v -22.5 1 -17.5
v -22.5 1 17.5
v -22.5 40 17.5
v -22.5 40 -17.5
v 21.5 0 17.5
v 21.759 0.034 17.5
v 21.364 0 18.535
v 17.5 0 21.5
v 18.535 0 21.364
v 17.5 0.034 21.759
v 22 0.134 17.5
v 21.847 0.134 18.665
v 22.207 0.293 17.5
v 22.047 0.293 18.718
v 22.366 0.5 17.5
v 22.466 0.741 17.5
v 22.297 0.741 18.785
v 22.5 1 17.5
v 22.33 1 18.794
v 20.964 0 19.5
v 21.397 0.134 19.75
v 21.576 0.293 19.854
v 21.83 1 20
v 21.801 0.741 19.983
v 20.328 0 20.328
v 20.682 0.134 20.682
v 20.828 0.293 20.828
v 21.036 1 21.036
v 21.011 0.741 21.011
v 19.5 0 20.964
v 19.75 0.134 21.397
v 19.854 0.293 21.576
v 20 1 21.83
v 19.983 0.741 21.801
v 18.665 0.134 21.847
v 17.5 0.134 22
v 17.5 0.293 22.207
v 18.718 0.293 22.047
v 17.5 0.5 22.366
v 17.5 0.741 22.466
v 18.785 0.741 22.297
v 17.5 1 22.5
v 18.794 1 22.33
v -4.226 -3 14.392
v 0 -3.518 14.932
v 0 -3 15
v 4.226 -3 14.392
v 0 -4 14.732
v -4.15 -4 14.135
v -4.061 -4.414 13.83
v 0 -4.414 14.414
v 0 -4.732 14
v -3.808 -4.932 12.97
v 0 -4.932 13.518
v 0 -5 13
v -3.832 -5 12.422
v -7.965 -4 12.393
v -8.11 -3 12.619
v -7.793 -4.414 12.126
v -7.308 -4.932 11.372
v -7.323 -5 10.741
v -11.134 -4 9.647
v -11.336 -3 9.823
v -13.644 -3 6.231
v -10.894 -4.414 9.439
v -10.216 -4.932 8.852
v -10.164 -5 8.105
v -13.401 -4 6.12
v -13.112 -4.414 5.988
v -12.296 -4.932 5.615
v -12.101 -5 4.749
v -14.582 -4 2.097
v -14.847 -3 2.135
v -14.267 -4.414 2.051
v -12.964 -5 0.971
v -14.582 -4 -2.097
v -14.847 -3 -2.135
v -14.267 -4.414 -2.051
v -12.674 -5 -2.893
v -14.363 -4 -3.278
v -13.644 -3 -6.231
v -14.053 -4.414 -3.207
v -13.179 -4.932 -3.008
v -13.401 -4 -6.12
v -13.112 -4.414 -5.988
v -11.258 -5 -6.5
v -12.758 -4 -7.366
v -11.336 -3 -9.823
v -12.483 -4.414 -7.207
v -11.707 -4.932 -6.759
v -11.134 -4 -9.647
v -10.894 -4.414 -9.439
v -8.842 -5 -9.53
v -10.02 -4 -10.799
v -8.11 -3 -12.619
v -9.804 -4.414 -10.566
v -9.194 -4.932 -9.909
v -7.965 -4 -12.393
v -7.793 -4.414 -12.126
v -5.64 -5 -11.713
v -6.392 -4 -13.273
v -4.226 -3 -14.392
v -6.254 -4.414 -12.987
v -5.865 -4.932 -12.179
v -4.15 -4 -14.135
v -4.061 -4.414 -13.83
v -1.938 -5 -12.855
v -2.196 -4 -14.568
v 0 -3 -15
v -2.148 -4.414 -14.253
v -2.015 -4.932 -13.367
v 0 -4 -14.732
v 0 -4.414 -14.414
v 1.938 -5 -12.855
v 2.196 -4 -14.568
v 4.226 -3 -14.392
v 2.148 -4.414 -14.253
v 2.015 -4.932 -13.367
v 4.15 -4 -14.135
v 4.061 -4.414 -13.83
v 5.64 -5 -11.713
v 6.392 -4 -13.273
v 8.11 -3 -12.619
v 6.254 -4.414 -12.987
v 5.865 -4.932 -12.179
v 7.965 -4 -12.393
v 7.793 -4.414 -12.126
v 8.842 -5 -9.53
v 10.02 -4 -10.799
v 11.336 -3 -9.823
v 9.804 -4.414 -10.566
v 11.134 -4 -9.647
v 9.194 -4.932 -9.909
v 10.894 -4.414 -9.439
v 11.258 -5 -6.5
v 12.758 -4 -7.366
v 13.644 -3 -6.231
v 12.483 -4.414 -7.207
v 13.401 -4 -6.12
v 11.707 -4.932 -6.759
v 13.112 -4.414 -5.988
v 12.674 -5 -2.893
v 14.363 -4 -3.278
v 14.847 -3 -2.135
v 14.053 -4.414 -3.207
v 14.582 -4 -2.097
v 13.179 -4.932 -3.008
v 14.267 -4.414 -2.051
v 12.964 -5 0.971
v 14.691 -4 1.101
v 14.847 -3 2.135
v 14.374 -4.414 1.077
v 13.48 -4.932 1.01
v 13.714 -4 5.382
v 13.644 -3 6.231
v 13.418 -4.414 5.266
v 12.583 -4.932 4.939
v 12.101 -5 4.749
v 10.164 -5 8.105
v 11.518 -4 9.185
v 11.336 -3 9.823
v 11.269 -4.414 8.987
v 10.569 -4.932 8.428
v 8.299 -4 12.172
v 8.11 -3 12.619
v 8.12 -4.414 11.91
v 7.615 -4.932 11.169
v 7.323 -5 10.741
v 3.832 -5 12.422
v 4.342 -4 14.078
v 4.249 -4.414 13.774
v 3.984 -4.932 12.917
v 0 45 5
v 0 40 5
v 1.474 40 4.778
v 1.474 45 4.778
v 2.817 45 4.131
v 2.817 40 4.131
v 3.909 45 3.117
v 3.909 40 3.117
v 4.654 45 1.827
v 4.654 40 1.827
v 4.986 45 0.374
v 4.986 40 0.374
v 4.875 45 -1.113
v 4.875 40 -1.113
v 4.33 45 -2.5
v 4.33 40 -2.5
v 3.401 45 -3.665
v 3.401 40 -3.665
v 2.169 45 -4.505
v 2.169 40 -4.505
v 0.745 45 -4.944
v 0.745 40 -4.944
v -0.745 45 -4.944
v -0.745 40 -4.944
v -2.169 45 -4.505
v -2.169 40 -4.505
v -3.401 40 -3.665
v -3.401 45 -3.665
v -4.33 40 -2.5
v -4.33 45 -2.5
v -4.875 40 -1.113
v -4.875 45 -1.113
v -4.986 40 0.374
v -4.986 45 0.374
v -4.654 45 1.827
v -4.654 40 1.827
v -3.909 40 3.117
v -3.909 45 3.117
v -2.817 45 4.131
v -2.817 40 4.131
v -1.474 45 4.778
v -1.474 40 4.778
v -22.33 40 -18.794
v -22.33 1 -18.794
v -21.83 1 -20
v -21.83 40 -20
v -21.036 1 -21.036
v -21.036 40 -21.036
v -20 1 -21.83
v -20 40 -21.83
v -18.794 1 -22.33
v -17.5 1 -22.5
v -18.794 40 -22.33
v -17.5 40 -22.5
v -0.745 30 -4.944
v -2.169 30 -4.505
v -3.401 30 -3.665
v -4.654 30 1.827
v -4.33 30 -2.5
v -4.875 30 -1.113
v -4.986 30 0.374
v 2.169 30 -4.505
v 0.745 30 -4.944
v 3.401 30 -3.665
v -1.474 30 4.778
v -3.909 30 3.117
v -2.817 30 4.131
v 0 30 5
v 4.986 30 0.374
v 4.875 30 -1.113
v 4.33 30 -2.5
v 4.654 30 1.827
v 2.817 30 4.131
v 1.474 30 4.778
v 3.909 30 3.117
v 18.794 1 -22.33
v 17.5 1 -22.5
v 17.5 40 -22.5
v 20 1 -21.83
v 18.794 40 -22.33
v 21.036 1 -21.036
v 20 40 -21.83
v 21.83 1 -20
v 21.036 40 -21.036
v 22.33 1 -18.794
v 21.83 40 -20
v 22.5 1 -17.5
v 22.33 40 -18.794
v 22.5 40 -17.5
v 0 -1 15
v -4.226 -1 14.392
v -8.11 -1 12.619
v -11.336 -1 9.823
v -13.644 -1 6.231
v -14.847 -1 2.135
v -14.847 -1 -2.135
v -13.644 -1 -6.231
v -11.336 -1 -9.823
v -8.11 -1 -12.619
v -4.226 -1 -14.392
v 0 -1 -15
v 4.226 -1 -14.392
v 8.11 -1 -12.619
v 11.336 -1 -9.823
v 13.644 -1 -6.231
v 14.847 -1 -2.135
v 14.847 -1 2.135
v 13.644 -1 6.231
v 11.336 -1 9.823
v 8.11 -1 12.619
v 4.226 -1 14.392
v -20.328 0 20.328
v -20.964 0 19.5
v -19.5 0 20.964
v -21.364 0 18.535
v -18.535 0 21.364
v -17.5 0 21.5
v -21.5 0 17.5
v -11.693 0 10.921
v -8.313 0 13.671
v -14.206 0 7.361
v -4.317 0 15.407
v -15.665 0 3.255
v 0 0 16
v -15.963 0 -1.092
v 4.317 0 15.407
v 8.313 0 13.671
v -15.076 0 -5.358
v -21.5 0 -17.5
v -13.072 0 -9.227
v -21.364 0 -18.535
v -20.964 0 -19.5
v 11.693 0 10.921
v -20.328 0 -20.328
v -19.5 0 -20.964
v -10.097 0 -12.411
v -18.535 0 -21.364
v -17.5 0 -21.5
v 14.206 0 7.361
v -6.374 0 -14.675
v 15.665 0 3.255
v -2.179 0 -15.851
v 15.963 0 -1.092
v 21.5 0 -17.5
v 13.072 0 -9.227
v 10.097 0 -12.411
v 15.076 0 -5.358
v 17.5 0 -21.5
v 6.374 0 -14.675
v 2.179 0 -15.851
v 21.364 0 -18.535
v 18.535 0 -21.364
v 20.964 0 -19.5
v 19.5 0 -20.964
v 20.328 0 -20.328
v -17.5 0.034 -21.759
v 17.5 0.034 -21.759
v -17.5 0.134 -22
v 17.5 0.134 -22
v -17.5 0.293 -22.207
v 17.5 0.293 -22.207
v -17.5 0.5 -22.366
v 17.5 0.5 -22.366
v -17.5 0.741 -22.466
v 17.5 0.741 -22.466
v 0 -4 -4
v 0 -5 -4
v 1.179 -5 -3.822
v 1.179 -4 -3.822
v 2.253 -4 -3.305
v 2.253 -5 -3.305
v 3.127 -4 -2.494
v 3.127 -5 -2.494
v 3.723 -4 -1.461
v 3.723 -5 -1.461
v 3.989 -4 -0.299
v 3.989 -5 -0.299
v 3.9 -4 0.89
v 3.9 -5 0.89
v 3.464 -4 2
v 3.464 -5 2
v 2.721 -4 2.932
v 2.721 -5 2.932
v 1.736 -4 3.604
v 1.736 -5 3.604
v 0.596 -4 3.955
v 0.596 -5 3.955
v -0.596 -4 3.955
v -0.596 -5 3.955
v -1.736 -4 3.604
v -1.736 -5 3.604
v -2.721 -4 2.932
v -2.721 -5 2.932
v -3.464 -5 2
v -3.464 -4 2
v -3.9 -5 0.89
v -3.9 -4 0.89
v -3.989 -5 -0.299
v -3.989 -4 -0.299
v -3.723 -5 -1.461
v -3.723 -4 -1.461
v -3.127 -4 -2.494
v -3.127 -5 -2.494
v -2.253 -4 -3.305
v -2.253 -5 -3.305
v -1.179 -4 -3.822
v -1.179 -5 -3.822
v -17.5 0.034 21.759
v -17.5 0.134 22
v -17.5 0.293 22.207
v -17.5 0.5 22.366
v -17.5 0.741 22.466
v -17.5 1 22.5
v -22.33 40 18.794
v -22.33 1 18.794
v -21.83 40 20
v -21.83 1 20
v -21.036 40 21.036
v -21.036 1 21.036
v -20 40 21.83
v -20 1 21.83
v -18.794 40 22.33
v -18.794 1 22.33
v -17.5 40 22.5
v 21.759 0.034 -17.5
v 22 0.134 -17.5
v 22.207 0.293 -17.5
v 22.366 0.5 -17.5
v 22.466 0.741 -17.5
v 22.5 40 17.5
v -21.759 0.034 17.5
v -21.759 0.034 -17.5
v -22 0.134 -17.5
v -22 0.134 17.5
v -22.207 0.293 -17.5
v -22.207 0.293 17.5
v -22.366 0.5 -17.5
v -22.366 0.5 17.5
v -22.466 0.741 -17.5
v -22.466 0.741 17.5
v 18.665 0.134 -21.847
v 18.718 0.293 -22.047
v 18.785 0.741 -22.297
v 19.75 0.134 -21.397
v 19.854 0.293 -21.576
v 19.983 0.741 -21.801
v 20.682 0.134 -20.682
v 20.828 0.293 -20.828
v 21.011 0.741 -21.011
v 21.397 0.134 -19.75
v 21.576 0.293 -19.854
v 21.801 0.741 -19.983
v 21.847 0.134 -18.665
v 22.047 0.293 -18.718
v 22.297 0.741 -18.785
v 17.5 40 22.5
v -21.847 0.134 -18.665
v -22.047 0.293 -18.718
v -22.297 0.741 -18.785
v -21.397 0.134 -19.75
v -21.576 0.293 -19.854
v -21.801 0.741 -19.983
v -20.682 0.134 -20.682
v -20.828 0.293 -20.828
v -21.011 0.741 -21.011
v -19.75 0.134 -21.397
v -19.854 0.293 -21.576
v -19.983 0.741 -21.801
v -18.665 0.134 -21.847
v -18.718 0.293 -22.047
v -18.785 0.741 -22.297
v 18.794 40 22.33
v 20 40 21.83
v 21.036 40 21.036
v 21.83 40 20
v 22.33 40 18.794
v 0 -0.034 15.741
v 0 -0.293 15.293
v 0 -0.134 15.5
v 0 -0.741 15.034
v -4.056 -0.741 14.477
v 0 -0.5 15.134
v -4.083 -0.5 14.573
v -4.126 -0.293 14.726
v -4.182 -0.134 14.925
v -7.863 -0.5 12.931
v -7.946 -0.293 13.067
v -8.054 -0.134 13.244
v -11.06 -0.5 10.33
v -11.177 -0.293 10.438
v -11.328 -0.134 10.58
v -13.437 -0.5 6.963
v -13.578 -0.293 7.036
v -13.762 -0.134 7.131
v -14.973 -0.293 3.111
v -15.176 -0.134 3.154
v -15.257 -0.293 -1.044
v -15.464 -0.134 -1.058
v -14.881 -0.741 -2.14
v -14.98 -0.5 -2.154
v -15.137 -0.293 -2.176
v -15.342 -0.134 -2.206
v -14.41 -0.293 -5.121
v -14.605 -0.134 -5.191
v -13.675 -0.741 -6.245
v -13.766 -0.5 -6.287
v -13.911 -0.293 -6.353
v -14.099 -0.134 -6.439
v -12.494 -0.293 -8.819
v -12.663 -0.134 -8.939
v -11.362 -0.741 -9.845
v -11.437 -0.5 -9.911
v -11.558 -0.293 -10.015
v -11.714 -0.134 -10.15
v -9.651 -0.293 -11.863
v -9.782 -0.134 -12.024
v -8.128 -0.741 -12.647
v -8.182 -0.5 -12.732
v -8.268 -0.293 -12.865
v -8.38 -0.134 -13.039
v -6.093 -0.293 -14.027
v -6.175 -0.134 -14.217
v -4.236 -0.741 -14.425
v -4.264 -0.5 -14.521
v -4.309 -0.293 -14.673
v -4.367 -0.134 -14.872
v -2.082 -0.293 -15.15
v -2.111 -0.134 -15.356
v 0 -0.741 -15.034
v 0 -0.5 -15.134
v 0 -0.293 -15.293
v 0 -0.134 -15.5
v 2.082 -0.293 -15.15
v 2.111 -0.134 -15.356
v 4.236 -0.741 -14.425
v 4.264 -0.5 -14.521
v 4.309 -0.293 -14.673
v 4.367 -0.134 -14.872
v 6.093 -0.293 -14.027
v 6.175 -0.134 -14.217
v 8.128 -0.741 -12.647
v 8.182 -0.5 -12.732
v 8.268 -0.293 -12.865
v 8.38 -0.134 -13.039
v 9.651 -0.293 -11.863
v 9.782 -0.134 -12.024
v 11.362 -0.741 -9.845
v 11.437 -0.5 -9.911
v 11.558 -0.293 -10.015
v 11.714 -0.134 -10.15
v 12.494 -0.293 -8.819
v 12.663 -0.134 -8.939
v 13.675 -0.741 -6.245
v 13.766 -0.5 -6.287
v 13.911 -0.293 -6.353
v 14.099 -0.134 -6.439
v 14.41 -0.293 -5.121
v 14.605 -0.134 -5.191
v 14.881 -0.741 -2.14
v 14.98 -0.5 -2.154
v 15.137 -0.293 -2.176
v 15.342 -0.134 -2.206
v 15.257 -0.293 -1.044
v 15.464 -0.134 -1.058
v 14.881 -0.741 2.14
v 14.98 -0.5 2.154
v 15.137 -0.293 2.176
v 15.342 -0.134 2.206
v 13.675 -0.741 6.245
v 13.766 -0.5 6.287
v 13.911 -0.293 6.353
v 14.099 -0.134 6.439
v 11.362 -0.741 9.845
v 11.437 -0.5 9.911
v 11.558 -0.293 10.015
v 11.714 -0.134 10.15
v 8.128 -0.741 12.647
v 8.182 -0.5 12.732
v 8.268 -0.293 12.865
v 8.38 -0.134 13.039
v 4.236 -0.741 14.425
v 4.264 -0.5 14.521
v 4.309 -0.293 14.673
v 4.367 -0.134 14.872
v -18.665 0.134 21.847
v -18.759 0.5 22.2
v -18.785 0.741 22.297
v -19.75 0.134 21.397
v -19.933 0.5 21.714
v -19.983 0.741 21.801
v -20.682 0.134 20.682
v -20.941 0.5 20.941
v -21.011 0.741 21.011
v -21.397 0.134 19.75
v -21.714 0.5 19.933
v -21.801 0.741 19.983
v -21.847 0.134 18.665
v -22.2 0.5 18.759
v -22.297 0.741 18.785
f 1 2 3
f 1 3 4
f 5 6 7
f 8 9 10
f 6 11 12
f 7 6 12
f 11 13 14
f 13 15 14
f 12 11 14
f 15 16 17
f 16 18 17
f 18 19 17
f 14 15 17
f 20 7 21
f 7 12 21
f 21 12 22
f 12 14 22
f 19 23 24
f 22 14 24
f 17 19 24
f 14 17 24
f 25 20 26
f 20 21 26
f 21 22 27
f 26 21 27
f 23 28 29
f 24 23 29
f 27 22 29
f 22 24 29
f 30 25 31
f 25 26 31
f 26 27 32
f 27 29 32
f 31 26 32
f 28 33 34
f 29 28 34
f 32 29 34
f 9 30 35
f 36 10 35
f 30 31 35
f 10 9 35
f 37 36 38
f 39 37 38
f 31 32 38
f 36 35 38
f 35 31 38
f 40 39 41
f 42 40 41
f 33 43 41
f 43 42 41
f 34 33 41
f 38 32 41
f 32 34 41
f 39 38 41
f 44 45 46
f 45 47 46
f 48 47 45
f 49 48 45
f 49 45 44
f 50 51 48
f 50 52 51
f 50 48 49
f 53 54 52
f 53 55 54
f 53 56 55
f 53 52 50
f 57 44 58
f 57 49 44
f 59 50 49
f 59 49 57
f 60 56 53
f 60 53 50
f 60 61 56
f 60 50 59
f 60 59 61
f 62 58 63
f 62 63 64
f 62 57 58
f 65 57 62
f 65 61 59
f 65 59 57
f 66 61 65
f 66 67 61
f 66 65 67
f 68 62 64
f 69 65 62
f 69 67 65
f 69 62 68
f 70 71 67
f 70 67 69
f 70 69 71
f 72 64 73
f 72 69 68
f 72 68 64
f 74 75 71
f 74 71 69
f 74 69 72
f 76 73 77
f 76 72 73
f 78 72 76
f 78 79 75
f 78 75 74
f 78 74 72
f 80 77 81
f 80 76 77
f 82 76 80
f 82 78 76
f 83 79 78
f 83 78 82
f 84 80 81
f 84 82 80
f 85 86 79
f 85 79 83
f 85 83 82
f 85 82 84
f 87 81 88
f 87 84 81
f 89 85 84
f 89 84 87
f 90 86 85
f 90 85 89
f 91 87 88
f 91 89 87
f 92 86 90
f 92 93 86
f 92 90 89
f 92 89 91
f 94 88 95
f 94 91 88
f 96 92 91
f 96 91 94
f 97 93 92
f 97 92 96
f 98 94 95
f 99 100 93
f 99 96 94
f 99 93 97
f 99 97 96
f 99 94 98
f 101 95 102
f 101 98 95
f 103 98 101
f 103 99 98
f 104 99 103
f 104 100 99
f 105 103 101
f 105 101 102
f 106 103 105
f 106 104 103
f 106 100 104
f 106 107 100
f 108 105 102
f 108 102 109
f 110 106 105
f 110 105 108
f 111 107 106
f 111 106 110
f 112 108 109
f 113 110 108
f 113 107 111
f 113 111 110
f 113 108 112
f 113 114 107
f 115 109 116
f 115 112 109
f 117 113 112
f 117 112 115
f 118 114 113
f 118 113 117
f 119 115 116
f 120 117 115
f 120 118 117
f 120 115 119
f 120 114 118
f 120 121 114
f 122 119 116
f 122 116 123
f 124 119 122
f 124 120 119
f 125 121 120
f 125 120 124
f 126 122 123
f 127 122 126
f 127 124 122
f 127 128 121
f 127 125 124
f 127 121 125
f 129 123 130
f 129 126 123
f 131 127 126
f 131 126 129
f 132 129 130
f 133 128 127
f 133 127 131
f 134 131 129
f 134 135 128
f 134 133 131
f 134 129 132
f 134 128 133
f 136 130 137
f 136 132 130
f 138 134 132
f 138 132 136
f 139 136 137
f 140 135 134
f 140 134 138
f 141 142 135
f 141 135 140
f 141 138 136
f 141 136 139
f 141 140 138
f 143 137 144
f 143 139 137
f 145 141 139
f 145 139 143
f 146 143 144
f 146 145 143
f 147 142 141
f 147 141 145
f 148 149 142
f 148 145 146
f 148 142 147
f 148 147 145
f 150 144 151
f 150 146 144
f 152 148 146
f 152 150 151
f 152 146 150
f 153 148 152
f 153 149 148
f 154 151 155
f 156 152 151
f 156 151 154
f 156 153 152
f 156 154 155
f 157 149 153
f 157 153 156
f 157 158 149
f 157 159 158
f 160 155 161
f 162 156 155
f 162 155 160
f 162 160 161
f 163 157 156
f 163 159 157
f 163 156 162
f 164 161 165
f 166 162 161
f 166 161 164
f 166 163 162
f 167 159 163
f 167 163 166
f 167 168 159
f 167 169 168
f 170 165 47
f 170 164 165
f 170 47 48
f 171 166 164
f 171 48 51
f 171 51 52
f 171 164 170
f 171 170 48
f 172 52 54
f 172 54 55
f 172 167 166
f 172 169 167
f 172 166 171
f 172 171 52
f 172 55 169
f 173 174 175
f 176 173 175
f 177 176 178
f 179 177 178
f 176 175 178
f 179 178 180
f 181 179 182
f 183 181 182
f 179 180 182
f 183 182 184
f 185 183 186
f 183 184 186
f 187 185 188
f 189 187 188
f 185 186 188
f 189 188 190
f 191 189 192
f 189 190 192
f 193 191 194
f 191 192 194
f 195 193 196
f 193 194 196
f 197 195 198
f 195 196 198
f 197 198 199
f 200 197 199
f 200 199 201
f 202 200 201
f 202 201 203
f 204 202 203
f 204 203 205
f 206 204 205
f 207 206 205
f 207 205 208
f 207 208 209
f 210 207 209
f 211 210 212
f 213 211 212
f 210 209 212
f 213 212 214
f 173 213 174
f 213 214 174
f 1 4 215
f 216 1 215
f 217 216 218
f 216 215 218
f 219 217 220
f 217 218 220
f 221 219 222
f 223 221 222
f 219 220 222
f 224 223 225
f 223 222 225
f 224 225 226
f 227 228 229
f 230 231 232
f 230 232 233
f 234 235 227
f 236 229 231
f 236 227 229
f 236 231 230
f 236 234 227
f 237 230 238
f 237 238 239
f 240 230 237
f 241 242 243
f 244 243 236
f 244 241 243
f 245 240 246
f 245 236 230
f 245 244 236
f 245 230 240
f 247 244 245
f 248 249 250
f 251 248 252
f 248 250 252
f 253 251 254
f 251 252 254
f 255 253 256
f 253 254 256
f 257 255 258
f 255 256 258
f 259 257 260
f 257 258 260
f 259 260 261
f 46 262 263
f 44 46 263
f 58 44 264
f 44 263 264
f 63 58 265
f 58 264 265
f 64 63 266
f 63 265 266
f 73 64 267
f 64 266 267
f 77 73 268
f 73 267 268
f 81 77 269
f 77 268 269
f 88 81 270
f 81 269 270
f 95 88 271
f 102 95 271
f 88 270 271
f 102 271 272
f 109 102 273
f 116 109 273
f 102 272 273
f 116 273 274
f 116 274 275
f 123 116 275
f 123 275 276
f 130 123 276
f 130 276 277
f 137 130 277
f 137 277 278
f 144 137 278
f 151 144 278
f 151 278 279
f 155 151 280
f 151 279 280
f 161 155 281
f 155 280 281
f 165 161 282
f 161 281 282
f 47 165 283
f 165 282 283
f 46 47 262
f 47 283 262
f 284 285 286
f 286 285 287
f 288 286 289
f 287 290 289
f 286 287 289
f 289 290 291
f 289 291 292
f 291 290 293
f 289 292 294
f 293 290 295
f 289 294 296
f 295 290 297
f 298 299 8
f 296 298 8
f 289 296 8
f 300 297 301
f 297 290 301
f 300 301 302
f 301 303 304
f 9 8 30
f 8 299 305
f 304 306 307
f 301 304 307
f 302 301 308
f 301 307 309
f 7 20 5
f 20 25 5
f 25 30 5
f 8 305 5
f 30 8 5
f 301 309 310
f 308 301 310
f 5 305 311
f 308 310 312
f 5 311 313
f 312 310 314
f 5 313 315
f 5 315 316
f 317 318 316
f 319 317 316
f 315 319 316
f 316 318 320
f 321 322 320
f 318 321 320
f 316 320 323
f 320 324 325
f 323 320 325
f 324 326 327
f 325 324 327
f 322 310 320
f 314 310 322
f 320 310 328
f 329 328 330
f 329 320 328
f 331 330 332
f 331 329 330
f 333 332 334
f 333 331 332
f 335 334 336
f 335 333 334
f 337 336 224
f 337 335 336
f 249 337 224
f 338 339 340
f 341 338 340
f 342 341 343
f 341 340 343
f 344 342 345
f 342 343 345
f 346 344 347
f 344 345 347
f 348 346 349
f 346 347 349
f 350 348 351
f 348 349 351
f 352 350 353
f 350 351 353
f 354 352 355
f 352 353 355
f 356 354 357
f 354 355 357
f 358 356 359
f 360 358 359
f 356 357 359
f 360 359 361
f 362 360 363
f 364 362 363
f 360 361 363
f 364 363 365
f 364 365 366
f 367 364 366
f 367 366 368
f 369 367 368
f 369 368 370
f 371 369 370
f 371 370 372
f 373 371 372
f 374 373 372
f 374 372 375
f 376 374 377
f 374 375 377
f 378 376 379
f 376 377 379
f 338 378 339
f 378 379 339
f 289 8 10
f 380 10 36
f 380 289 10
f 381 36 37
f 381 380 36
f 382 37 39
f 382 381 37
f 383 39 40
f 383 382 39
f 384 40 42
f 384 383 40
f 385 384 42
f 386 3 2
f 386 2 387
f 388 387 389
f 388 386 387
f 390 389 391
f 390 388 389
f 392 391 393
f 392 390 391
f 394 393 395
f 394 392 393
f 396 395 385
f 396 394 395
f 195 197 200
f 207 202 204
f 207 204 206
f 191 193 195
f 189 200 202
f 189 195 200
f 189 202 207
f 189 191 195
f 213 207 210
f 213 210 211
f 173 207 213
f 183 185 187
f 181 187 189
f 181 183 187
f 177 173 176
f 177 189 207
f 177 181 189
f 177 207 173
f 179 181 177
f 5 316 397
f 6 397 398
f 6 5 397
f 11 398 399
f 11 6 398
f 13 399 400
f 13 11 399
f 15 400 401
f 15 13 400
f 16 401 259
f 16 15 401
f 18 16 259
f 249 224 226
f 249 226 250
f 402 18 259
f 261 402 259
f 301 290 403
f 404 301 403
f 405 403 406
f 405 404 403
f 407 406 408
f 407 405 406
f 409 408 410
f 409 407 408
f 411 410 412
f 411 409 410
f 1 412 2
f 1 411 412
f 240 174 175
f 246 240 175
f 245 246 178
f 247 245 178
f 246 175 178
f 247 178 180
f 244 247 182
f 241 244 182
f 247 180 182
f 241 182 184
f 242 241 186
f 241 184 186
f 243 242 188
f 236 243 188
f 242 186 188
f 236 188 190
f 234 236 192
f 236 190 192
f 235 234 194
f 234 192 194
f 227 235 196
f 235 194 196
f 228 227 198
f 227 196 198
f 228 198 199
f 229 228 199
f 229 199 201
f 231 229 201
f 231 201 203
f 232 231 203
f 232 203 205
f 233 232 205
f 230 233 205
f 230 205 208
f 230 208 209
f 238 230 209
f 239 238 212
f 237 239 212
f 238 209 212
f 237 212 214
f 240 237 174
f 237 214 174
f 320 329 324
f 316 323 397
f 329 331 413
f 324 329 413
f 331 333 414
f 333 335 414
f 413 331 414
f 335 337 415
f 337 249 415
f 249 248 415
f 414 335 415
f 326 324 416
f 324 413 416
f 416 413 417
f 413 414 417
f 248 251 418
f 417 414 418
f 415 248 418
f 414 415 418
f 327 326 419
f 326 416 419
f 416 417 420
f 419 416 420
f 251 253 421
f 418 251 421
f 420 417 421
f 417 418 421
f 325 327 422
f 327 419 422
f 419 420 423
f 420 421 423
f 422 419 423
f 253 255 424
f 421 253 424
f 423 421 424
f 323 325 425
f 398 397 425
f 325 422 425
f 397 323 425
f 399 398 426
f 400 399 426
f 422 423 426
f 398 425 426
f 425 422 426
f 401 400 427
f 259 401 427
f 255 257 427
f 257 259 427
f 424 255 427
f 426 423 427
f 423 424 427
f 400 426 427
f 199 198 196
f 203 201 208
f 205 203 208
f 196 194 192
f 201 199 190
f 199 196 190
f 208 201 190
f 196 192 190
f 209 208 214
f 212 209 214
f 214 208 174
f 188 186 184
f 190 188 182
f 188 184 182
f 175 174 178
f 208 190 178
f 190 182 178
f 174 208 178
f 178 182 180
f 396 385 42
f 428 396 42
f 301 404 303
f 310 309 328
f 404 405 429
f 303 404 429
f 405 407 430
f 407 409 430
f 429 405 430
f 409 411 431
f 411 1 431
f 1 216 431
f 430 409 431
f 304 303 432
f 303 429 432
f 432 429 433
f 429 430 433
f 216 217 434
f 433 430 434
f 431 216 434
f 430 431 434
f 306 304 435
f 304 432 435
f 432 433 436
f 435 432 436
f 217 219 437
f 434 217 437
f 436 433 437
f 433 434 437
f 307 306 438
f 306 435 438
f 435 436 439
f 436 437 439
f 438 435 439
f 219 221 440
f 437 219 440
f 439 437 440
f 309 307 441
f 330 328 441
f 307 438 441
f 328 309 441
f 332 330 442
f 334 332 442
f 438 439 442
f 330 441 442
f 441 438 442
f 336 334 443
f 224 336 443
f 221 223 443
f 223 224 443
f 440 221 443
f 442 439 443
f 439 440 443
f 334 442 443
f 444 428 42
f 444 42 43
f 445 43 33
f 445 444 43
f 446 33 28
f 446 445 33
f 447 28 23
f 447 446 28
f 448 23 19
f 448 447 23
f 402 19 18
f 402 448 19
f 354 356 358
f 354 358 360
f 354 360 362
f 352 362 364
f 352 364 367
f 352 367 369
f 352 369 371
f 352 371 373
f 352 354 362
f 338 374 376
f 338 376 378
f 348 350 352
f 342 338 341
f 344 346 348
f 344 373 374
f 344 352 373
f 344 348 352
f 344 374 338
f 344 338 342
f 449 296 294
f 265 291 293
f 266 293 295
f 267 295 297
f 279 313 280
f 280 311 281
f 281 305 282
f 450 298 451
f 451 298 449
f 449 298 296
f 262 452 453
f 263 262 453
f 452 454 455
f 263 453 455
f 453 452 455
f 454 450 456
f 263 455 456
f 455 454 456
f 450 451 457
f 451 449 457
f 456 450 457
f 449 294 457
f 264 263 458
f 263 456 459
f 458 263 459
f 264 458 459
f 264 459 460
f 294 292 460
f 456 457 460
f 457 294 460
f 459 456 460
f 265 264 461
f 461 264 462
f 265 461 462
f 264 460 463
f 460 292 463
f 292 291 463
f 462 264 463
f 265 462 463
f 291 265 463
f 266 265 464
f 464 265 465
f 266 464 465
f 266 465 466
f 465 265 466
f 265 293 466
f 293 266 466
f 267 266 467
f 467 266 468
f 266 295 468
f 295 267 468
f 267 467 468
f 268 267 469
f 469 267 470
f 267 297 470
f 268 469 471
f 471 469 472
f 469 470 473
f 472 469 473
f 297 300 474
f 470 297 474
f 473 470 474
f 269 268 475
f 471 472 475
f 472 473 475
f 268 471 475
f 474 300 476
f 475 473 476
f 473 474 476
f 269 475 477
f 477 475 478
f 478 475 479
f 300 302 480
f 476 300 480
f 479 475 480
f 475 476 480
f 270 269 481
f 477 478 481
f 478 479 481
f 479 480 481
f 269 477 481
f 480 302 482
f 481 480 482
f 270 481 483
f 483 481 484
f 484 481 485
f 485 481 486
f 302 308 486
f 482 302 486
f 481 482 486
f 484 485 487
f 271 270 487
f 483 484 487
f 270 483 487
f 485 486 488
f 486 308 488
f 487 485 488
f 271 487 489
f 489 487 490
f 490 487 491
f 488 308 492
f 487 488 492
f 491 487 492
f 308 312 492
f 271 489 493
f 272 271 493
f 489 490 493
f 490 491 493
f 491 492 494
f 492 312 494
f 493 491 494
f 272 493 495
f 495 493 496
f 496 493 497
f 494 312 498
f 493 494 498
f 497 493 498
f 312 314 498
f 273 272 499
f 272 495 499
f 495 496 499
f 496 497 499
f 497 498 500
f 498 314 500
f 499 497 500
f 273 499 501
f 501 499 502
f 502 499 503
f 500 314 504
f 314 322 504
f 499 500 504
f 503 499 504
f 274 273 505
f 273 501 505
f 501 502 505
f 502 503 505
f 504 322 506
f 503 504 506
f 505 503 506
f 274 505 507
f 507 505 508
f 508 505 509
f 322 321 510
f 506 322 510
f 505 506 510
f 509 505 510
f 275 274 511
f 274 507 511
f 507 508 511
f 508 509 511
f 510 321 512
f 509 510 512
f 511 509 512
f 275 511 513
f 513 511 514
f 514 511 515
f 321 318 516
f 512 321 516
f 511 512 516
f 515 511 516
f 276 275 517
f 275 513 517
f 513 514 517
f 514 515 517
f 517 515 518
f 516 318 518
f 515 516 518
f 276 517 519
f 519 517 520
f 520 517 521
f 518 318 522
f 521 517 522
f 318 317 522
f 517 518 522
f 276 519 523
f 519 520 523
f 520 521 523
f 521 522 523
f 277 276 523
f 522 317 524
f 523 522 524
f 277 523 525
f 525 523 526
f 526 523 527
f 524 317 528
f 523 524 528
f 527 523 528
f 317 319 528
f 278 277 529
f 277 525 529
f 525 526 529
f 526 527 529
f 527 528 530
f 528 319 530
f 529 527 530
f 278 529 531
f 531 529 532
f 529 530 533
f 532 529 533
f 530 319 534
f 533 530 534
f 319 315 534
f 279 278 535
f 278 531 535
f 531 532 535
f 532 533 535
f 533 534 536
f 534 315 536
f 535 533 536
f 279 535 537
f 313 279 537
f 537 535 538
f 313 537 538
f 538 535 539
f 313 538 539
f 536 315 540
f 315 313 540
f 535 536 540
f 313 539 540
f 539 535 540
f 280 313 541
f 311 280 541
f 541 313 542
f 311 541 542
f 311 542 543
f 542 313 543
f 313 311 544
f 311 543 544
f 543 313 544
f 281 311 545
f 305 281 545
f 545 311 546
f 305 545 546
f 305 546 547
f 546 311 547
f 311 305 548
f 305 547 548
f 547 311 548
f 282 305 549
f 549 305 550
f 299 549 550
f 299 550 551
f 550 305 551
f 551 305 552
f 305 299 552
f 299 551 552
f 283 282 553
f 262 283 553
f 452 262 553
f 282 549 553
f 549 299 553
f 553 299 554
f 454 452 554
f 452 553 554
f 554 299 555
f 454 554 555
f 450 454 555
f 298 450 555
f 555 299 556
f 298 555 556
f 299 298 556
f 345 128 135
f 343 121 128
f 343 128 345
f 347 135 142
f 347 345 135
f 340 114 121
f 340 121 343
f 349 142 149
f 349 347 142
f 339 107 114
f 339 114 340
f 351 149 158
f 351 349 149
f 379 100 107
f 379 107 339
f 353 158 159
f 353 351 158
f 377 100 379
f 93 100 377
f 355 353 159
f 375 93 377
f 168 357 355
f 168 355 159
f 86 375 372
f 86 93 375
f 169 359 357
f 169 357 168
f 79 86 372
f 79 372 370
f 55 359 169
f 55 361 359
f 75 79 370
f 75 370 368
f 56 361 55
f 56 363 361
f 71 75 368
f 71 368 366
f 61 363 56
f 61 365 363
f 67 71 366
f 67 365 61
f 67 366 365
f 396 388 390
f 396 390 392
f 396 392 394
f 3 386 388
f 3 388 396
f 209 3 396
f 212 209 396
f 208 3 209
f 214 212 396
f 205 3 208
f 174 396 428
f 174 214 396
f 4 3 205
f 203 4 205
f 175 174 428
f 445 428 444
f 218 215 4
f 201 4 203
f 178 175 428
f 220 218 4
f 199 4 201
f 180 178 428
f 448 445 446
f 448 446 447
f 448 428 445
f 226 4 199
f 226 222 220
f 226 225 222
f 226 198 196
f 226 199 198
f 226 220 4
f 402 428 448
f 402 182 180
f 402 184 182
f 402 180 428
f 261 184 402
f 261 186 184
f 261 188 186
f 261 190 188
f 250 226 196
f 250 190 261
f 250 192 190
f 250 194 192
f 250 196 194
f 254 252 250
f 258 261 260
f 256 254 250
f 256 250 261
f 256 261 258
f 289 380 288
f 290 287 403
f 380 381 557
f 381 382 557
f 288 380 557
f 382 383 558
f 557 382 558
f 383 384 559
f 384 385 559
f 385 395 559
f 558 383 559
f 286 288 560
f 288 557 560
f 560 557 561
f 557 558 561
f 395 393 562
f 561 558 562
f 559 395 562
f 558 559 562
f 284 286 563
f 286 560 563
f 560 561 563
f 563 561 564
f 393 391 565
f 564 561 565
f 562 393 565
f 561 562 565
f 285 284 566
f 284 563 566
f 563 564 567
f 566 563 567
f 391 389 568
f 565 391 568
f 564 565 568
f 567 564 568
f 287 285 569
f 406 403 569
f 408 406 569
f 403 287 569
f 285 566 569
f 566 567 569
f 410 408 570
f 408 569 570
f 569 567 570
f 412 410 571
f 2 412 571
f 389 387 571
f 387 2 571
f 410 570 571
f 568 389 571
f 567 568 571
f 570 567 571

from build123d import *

# Parameters (mm, degrees)
CROQUIS1_W     = 45
CROQUIS1_H     = 45
EXTRUIR1_DEPTH = 40
CROQUIS2_R     = 5
EXTRUIR2_DEPTH = 10
REDONDEO1_R    = 5
CROQUIS3_R     = 15
EXTRUIR3_DEPTH = 5
REDONDEO2_R    = 2
REDONDEO3_R    = 1
CROQUIS4_R     = 4
EXTRUIR4_DEPTH = 1
CROQUIS5_R     = 5
EXTRUIR5_DEPTH = 5


with BuildPart() as part:
    # Croquis1 → Extruir1 (new body)
    with BuildSketch(Plane(origin=(0, 0, 0), x_dir=(1, 0, 0), z_dir=(0, 1, 0))):
        Rectangle(CROQUIS1_W, CROQUIS1_H)
    extrude(amount=EXTRUIR1_DEPTH)

    # Croquis2 → Extruir2 (cut)
    with BuildSketch(Plane(origin=(0, 40, 0), x_dir=(1, 0, 0), z_dir=(0, 1, 0))):
        with Locations(Location((0, 0, 0), (0, 0, 270))):
            Circle(CROQUIS2_R)
    extrude(amount=-EXTRUIR2_DEPTH, mode=Mode.SUBTRACT)

    # Redondeo1
    redondeo1_edges = [part.edges().sort_by_distance(p)[0] for p in [
        (-22.5, 20, -22.5),
        (22.5, 20, -22.5),
        (22.5, 20, 22.5),
        (-22.5, 20, 22.5),
    ]]
    fillet(redondeo1_edges, radius=REDONDEO1_R)

    # Croquis3 → Extruir3 (add)
    with BuildSketch(Plane.XZ):
        with Locations(Location((0, 0, 0), (0, 0, 90))):
            Circle(CROQUIS3_R)
    extrude(amount=EXTRUIR3_DEPTH)

    # Redondeo2
    redondeo2_edges = [part.edges().sort_by_distance(p)[0] for p in [
        (0, -5, -15),
    ]]
    fillet(redondeo2_edges, radius=REDONDEO2_R)

    # Redondeo3
    redondeo3_edges = [part.edges().sort_by_distance(p)[0] for p in [
        (-22.5, 0, 0),
        (0, 0, -22.5),
        (22.5, 0, 0),
        (0, 0, 22.5),
        (-21.035533906, 0, 21.035533906),
        (21.035533906, 0, 21.035533906),
        (21.035533906, 0, -21.035533906),
        (-21.035533906, 0, -21.035533906),
        (0, 0, -15),
    ]]
    fillet(redondeo3_edges, radius=REDONDEO3_R)

    # Croquis4 → Extruir4 (cut)
    with BuildSketch(Plane.XZ.offset(5)):
        with Locations(Location((0, 0, 0), (0, 0, 270))):
            Circle(CROQUIS4_R)
    extrude(amount=-EXTRUIR4_DEPTH, mode=Mode.SUBTRACT)


with BuildPart() as body_2:
    # Croquis5 → Extruir5 (new body)
    with BuildSketch(Plane(origin=(0, 40, 0), x_dir=(1, 0, 0), z_dir=(0, 1, 0))):
        with Locations(Location((0, 0, 0), (0, 0, 270))):
            Circle(CROQUIS5_R)
    extrude(amount=EXTRUIR5_DEPTH)


solid = Compound([part.part, body_2.part])
